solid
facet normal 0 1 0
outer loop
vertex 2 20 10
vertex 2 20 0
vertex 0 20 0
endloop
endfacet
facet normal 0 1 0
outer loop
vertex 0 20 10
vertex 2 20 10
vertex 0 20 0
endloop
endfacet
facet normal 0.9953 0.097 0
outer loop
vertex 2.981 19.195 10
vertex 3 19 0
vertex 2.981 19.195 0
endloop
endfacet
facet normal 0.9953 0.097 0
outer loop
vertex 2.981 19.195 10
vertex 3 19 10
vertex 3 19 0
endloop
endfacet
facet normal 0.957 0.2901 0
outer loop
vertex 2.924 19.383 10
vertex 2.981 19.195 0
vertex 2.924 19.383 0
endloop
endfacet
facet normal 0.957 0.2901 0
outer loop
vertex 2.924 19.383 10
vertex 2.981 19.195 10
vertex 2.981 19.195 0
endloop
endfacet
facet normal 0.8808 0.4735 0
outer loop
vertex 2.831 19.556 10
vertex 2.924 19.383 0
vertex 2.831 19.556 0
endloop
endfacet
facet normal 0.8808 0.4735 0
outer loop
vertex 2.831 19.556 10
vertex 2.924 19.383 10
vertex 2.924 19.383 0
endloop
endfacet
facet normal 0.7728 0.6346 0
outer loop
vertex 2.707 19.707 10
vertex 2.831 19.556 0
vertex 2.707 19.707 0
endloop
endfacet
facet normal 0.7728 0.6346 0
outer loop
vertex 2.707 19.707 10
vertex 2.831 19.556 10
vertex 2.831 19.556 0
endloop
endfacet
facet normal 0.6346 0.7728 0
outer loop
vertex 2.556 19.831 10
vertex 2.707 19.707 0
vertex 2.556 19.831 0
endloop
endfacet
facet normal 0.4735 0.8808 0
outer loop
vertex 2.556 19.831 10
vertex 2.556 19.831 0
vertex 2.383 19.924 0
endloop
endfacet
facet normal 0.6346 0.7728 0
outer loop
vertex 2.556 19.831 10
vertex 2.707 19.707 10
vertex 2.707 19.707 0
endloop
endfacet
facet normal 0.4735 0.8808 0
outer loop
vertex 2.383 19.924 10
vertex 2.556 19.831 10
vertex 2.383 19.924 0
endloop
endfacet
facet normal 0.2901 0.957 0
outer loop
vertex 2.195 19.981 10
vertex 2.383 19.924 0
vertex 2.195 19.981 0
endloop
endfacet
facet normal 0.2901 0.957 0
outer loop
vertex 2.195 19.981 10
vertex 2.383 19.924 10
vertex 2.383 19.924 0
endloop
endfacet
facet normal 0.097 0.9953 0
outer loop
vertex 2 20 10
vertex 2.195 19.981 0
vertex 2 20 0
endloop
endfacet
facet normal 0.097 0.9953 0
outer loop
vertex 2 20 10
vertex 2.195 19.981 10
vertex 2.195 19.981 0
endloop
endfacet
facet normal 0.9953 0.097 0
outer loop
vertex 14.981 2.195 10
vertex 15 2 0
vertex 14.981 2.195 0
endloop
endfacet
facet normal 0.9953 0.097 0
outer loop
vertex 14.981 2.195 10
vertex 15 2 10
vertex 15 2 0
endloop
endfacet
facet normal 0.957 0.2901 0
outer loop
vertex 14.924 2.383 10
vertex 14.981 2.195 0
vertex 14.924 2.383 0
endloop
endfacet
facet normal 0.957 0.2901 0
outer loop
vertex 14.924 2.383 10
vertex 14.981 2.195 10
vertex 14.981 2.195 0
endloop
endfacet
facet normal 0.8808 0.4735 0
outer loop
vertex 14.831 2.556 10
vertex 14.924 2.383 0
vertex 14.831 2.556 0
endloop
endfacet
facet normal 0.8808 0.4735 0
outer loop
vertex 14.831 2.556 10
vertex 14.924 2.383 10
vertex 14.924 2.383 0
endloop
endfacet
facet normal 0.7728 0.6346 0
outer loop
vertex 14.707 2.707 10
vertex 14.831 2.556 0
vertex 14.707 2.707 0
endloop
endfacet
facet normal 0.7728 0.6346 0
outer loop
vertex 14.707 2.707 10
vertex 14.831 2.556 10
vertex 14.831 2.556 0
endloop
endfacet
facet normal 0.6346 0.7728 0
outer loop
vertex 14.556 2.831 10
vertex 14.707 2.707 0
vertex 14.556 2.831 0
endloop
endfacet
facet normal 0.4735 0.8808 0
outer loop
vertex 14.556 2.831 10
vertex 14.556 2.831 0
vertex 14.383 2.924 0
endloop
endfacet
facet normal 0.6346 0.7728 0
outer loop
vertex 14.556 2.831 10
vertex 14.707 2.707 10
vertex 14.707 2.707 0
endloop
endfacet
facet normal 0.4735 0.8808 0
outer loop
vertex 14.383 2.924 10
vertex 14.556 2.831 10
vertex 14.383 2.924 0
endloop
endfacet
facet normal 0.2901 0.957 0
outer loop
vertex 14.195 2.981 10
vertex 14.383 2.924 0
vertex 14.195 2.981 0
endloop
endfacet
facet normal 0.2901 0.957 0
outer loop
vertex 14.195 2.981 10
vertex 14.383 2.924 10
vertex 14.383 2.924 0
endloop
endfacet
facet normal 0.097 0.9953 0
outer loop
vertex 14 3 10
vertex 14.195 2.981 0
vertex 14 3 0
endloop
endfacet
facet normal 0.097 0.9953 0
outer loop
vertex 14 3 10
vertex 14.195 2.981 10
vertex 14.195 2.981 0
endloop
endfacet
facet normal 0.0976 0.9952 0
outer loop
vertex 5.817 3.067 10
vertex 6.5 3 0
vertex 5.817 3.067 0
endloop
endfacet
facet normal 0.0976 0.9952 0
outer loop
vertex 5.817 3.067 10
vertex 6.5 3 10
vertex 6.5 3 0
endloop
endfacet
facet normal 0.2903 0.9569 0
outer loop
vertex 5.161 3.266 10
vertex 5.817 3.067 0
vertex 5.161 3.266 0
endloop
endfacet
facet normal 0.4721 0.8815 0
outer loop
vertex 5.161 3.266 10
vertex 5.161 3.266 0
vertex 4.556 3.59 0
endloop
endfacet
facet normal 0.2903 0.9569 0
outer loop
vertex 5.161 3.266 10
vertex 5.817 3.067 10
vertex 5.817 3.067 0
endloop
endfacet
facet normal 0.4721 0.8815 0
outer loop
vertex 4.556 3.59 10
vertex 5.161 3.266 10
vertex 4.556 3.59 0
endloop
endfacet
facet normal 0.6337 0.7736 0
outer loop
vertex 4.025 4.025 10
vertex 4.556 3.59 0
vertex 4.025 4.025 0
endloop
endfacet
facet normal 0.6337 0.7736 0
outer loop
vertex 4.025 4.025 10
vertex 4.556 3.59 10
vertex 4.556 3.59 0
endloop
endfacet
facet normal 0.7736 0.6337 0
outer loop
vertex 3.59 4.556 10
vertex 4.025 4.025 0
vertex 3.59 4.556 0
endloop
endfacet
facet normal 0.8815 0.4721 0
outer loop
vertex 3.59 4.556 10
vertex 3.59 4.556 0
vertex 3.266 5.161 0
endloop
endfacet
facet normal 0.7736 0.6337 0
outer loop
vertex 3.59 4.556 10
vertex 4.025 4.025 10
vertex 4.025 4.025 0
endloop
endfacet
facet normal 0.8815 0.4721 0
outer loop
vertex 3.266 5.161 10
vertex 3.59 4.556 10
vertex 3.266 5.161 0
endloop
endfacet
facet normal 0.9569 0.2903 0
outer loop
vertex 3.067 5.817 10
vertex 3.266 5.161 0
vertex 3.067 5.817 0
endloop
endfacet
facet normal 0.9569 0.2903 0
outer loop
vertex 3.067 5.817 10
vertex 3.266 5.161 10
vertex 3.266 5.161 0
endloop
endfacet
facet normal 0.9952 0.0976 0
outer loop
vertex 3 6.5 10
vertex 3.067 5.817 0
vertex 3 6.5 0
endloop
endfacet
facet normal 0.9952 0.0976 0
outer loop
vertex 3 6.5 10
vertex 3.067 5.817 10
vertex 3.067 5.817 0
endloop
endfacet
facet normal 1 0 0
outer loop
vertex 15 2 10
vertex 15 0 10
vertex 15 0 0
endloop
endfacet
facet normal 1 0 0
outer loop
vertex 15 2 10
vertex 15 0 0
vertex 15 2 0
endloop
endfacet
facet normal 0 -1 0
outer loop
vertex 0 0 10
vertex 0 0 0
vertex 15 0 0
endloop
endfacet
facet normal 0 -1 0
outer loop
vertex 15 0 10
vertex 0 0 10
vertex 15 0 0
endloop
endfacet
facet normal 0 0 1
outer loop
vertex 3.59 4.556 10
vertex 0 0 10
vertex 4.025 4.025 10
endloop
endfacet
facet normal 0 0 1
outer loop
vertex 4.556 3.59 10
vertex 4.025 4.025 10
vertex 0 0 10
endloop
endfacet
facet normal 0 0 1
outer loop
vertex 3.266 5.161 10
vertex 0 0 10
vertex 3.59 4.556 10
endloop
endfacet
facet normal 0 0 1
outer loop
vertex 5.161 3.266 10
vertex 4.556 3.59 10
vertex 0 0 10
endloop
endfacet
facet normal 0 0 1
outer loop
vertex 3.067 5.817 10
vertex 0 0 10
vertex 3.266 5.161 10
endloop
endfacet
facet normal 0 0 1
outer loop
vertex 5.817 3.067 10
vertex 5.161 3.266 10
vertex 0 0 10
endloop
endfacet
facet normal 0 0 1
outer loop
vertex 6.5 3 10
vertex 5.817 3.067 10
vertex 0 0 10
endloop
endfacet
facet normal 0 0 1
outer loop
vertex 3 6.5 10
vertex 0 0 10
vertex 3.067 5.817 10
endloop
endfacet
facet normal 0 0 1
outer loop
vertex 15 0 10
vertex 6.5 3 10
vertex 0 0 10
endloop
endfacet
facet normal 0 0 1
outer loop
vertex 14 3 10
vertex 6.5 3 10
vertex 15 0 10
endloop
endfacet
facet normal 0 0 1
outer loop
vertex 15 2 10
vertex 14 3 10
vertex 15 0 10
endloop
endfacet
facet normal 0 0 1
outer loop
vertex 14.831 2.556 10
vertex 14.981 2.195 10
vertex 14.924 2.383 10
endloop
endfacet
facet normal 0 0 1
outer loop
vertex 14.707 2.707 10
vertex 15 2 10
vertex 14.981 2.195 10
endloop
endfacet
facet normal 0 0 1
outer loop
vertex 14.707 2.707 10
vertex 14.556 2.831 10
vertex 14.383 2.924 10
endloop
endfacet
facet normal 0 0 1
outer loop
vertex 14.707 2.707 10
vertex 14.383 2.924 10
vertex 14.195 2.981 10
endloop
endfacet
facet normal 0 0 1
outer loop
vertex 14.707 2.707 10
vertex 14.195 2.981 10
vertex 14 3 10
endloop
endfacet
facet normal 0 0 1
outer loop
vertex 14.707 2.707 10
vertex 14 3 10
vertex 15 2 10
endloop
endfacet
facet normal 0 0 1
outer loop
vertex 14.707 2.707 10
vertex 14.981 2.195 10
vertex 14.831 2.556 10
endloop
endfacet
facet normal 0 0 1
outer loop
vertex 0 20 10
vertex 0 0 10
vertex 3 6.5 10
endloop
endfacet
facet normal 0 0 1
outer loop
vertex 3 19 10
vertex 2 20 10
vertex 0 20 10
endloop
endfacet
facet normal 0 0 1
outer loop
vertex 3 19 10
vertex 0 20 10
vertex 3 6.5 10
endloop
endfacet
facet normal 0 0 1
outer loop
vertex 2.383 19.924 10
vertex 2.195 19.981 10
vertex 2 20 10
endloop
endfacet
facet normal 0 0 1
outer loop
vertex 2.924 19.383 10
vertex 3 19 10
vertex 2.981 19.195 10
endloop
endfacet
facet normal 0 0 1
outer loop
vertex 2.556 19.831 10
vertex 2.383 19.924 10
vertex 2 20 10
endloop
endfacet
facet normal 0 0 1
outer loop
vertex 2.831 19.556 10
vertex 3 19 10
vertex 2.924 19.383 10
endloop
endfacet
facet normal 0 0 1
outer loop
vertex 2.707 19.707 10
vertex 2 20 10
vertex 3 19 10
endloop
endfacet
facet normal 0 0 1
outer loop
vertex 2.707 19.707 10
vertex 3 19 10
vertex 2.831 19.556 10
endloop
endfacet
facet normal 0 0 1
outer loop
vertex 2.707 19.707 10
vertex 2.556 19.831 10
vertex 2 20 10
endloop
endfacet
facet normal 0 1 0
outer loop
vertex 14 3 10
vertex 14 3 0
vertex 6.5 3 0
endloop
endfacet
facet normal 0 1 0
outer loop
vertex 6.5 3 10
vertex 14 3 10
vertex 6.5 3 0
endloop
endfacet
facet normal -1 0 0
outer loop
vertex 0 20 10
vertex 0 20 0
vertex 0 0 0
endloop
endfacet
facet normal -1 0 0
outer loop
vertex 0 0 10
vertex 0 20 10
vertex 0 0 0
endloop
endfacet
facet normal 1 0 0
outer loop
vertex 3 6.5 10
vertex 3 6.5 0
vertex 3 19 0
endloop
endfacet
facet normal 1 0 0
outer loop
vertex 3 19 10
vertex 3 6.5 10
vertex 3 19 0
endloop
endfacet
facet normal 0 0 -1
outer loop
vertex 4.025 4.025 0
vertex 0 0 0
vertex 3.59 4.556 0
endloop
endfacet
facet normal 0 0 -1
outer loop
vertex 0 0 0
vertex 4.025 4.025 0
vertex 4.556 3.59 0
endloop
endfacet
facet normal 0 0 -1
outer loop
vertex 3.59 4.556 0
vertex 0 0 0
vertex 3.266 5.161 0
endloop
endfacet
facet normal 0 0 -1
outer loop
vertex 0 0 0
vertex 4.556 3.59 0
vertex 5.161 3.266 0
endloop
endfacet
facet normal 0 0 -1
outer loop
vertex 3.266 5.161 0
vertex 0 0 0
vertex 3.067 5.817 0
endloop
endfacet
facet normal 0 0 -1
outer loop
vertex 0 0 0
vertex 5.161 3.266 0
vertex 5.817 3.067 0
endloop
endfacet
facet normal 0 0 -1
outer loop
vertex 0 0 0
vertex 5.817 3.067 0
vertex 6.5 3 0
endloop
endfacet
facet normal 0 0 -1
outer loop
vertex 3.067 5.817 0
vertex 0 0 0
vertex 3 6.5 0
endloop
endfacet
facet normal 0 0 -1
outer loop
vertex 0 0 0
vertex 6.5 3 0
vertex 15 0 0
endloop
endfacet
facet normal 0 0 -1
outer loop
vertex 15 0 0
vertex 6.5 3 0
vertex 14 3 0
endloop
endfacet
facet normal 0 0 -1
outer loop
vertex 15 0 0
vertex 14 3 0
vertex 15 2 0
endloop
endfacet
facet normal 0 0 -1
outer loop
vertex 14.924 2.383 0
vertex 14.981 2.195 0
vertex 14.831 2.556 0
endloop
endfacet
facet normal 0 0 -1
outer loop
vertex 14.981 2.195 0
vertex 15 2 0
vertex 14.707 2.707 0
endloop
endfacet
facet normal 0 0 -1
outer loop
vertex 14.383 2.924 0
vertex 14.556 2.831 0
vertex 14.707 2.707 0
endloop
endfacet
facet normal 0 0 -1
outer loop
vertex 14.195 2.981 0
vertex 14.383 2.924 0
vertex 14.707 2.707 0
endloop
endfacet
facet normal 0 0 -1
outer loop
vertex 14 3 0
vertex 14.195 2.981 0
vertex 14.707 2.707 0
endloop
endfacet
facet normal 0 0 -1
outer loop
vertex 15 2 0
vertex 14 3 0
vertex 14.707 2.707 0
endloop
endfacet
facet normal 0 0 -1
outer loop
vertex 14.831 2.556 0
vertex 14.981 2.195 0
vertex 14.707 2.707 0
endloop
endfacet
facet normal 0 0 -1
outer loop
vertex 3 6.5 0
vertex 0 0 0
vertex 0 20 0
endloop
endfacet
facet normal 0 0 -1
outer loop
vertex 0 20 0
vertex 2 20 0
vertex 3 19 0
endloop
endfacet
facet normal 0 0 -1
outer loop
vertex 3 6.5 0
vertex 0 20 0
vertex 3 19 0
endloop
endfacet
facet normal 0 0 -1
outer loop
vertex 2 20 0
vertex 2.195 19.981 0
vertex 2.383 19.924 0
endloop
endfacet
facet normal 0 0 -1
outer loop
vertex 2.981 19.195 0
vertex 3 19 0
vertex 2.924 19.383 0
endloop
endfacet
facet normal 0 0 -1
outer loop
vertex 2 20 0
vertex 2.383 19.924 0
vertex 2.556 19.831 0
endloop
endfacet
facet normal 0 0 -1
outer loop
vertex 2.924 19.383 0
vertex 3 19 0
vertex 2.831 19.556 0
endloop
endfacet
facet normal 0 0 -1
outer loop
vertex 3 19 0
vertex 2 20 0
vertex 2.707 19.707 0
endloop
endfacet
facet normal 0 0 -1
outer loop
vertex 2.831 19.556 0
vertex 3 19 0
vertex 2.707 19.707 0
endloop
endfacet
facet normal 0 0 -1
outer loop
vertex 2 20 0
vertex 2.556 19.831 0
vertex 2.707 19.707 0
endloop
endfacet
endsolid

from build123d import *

# Parameters (mm, degrees)
EXTRUDE_1_DEPTH = 10
FILLET_1_R      = 1
FILLET_2_R      = 3.5


with BuildPart() as part:
    # 草图1 → 凸台-拉伸1 (new body)
    with BuildSketch(Plane(origin=(0, 0, 0), x_dir=(-1, 0, 0), z_dir=(0, 0, -1))):
        Polygon((0, 20), (0, 0), (-15, 0), (-15, 3), (-3, 3), (-3, 20), align=None)
    extrude(amount=-EXTRUDE_1_DEPTH)

    # 圆角1
    fillet_1_edges = [part.edges().sort_by_distance(p)[0] for p in [
        (15, 3, 5),
        (3, 20, 5),
    ]]
    fillet(fillet_1_edges, radius=FILLET_1_R)

    # 圆角2
    fillet_2_edges = [part.edges().sort_by_distance(p)[0] for p in [
        (3, 3, 5),
    ]]
    fillet(fillet_2_edges, radius=FILLET_2_R)


solid = part.part
